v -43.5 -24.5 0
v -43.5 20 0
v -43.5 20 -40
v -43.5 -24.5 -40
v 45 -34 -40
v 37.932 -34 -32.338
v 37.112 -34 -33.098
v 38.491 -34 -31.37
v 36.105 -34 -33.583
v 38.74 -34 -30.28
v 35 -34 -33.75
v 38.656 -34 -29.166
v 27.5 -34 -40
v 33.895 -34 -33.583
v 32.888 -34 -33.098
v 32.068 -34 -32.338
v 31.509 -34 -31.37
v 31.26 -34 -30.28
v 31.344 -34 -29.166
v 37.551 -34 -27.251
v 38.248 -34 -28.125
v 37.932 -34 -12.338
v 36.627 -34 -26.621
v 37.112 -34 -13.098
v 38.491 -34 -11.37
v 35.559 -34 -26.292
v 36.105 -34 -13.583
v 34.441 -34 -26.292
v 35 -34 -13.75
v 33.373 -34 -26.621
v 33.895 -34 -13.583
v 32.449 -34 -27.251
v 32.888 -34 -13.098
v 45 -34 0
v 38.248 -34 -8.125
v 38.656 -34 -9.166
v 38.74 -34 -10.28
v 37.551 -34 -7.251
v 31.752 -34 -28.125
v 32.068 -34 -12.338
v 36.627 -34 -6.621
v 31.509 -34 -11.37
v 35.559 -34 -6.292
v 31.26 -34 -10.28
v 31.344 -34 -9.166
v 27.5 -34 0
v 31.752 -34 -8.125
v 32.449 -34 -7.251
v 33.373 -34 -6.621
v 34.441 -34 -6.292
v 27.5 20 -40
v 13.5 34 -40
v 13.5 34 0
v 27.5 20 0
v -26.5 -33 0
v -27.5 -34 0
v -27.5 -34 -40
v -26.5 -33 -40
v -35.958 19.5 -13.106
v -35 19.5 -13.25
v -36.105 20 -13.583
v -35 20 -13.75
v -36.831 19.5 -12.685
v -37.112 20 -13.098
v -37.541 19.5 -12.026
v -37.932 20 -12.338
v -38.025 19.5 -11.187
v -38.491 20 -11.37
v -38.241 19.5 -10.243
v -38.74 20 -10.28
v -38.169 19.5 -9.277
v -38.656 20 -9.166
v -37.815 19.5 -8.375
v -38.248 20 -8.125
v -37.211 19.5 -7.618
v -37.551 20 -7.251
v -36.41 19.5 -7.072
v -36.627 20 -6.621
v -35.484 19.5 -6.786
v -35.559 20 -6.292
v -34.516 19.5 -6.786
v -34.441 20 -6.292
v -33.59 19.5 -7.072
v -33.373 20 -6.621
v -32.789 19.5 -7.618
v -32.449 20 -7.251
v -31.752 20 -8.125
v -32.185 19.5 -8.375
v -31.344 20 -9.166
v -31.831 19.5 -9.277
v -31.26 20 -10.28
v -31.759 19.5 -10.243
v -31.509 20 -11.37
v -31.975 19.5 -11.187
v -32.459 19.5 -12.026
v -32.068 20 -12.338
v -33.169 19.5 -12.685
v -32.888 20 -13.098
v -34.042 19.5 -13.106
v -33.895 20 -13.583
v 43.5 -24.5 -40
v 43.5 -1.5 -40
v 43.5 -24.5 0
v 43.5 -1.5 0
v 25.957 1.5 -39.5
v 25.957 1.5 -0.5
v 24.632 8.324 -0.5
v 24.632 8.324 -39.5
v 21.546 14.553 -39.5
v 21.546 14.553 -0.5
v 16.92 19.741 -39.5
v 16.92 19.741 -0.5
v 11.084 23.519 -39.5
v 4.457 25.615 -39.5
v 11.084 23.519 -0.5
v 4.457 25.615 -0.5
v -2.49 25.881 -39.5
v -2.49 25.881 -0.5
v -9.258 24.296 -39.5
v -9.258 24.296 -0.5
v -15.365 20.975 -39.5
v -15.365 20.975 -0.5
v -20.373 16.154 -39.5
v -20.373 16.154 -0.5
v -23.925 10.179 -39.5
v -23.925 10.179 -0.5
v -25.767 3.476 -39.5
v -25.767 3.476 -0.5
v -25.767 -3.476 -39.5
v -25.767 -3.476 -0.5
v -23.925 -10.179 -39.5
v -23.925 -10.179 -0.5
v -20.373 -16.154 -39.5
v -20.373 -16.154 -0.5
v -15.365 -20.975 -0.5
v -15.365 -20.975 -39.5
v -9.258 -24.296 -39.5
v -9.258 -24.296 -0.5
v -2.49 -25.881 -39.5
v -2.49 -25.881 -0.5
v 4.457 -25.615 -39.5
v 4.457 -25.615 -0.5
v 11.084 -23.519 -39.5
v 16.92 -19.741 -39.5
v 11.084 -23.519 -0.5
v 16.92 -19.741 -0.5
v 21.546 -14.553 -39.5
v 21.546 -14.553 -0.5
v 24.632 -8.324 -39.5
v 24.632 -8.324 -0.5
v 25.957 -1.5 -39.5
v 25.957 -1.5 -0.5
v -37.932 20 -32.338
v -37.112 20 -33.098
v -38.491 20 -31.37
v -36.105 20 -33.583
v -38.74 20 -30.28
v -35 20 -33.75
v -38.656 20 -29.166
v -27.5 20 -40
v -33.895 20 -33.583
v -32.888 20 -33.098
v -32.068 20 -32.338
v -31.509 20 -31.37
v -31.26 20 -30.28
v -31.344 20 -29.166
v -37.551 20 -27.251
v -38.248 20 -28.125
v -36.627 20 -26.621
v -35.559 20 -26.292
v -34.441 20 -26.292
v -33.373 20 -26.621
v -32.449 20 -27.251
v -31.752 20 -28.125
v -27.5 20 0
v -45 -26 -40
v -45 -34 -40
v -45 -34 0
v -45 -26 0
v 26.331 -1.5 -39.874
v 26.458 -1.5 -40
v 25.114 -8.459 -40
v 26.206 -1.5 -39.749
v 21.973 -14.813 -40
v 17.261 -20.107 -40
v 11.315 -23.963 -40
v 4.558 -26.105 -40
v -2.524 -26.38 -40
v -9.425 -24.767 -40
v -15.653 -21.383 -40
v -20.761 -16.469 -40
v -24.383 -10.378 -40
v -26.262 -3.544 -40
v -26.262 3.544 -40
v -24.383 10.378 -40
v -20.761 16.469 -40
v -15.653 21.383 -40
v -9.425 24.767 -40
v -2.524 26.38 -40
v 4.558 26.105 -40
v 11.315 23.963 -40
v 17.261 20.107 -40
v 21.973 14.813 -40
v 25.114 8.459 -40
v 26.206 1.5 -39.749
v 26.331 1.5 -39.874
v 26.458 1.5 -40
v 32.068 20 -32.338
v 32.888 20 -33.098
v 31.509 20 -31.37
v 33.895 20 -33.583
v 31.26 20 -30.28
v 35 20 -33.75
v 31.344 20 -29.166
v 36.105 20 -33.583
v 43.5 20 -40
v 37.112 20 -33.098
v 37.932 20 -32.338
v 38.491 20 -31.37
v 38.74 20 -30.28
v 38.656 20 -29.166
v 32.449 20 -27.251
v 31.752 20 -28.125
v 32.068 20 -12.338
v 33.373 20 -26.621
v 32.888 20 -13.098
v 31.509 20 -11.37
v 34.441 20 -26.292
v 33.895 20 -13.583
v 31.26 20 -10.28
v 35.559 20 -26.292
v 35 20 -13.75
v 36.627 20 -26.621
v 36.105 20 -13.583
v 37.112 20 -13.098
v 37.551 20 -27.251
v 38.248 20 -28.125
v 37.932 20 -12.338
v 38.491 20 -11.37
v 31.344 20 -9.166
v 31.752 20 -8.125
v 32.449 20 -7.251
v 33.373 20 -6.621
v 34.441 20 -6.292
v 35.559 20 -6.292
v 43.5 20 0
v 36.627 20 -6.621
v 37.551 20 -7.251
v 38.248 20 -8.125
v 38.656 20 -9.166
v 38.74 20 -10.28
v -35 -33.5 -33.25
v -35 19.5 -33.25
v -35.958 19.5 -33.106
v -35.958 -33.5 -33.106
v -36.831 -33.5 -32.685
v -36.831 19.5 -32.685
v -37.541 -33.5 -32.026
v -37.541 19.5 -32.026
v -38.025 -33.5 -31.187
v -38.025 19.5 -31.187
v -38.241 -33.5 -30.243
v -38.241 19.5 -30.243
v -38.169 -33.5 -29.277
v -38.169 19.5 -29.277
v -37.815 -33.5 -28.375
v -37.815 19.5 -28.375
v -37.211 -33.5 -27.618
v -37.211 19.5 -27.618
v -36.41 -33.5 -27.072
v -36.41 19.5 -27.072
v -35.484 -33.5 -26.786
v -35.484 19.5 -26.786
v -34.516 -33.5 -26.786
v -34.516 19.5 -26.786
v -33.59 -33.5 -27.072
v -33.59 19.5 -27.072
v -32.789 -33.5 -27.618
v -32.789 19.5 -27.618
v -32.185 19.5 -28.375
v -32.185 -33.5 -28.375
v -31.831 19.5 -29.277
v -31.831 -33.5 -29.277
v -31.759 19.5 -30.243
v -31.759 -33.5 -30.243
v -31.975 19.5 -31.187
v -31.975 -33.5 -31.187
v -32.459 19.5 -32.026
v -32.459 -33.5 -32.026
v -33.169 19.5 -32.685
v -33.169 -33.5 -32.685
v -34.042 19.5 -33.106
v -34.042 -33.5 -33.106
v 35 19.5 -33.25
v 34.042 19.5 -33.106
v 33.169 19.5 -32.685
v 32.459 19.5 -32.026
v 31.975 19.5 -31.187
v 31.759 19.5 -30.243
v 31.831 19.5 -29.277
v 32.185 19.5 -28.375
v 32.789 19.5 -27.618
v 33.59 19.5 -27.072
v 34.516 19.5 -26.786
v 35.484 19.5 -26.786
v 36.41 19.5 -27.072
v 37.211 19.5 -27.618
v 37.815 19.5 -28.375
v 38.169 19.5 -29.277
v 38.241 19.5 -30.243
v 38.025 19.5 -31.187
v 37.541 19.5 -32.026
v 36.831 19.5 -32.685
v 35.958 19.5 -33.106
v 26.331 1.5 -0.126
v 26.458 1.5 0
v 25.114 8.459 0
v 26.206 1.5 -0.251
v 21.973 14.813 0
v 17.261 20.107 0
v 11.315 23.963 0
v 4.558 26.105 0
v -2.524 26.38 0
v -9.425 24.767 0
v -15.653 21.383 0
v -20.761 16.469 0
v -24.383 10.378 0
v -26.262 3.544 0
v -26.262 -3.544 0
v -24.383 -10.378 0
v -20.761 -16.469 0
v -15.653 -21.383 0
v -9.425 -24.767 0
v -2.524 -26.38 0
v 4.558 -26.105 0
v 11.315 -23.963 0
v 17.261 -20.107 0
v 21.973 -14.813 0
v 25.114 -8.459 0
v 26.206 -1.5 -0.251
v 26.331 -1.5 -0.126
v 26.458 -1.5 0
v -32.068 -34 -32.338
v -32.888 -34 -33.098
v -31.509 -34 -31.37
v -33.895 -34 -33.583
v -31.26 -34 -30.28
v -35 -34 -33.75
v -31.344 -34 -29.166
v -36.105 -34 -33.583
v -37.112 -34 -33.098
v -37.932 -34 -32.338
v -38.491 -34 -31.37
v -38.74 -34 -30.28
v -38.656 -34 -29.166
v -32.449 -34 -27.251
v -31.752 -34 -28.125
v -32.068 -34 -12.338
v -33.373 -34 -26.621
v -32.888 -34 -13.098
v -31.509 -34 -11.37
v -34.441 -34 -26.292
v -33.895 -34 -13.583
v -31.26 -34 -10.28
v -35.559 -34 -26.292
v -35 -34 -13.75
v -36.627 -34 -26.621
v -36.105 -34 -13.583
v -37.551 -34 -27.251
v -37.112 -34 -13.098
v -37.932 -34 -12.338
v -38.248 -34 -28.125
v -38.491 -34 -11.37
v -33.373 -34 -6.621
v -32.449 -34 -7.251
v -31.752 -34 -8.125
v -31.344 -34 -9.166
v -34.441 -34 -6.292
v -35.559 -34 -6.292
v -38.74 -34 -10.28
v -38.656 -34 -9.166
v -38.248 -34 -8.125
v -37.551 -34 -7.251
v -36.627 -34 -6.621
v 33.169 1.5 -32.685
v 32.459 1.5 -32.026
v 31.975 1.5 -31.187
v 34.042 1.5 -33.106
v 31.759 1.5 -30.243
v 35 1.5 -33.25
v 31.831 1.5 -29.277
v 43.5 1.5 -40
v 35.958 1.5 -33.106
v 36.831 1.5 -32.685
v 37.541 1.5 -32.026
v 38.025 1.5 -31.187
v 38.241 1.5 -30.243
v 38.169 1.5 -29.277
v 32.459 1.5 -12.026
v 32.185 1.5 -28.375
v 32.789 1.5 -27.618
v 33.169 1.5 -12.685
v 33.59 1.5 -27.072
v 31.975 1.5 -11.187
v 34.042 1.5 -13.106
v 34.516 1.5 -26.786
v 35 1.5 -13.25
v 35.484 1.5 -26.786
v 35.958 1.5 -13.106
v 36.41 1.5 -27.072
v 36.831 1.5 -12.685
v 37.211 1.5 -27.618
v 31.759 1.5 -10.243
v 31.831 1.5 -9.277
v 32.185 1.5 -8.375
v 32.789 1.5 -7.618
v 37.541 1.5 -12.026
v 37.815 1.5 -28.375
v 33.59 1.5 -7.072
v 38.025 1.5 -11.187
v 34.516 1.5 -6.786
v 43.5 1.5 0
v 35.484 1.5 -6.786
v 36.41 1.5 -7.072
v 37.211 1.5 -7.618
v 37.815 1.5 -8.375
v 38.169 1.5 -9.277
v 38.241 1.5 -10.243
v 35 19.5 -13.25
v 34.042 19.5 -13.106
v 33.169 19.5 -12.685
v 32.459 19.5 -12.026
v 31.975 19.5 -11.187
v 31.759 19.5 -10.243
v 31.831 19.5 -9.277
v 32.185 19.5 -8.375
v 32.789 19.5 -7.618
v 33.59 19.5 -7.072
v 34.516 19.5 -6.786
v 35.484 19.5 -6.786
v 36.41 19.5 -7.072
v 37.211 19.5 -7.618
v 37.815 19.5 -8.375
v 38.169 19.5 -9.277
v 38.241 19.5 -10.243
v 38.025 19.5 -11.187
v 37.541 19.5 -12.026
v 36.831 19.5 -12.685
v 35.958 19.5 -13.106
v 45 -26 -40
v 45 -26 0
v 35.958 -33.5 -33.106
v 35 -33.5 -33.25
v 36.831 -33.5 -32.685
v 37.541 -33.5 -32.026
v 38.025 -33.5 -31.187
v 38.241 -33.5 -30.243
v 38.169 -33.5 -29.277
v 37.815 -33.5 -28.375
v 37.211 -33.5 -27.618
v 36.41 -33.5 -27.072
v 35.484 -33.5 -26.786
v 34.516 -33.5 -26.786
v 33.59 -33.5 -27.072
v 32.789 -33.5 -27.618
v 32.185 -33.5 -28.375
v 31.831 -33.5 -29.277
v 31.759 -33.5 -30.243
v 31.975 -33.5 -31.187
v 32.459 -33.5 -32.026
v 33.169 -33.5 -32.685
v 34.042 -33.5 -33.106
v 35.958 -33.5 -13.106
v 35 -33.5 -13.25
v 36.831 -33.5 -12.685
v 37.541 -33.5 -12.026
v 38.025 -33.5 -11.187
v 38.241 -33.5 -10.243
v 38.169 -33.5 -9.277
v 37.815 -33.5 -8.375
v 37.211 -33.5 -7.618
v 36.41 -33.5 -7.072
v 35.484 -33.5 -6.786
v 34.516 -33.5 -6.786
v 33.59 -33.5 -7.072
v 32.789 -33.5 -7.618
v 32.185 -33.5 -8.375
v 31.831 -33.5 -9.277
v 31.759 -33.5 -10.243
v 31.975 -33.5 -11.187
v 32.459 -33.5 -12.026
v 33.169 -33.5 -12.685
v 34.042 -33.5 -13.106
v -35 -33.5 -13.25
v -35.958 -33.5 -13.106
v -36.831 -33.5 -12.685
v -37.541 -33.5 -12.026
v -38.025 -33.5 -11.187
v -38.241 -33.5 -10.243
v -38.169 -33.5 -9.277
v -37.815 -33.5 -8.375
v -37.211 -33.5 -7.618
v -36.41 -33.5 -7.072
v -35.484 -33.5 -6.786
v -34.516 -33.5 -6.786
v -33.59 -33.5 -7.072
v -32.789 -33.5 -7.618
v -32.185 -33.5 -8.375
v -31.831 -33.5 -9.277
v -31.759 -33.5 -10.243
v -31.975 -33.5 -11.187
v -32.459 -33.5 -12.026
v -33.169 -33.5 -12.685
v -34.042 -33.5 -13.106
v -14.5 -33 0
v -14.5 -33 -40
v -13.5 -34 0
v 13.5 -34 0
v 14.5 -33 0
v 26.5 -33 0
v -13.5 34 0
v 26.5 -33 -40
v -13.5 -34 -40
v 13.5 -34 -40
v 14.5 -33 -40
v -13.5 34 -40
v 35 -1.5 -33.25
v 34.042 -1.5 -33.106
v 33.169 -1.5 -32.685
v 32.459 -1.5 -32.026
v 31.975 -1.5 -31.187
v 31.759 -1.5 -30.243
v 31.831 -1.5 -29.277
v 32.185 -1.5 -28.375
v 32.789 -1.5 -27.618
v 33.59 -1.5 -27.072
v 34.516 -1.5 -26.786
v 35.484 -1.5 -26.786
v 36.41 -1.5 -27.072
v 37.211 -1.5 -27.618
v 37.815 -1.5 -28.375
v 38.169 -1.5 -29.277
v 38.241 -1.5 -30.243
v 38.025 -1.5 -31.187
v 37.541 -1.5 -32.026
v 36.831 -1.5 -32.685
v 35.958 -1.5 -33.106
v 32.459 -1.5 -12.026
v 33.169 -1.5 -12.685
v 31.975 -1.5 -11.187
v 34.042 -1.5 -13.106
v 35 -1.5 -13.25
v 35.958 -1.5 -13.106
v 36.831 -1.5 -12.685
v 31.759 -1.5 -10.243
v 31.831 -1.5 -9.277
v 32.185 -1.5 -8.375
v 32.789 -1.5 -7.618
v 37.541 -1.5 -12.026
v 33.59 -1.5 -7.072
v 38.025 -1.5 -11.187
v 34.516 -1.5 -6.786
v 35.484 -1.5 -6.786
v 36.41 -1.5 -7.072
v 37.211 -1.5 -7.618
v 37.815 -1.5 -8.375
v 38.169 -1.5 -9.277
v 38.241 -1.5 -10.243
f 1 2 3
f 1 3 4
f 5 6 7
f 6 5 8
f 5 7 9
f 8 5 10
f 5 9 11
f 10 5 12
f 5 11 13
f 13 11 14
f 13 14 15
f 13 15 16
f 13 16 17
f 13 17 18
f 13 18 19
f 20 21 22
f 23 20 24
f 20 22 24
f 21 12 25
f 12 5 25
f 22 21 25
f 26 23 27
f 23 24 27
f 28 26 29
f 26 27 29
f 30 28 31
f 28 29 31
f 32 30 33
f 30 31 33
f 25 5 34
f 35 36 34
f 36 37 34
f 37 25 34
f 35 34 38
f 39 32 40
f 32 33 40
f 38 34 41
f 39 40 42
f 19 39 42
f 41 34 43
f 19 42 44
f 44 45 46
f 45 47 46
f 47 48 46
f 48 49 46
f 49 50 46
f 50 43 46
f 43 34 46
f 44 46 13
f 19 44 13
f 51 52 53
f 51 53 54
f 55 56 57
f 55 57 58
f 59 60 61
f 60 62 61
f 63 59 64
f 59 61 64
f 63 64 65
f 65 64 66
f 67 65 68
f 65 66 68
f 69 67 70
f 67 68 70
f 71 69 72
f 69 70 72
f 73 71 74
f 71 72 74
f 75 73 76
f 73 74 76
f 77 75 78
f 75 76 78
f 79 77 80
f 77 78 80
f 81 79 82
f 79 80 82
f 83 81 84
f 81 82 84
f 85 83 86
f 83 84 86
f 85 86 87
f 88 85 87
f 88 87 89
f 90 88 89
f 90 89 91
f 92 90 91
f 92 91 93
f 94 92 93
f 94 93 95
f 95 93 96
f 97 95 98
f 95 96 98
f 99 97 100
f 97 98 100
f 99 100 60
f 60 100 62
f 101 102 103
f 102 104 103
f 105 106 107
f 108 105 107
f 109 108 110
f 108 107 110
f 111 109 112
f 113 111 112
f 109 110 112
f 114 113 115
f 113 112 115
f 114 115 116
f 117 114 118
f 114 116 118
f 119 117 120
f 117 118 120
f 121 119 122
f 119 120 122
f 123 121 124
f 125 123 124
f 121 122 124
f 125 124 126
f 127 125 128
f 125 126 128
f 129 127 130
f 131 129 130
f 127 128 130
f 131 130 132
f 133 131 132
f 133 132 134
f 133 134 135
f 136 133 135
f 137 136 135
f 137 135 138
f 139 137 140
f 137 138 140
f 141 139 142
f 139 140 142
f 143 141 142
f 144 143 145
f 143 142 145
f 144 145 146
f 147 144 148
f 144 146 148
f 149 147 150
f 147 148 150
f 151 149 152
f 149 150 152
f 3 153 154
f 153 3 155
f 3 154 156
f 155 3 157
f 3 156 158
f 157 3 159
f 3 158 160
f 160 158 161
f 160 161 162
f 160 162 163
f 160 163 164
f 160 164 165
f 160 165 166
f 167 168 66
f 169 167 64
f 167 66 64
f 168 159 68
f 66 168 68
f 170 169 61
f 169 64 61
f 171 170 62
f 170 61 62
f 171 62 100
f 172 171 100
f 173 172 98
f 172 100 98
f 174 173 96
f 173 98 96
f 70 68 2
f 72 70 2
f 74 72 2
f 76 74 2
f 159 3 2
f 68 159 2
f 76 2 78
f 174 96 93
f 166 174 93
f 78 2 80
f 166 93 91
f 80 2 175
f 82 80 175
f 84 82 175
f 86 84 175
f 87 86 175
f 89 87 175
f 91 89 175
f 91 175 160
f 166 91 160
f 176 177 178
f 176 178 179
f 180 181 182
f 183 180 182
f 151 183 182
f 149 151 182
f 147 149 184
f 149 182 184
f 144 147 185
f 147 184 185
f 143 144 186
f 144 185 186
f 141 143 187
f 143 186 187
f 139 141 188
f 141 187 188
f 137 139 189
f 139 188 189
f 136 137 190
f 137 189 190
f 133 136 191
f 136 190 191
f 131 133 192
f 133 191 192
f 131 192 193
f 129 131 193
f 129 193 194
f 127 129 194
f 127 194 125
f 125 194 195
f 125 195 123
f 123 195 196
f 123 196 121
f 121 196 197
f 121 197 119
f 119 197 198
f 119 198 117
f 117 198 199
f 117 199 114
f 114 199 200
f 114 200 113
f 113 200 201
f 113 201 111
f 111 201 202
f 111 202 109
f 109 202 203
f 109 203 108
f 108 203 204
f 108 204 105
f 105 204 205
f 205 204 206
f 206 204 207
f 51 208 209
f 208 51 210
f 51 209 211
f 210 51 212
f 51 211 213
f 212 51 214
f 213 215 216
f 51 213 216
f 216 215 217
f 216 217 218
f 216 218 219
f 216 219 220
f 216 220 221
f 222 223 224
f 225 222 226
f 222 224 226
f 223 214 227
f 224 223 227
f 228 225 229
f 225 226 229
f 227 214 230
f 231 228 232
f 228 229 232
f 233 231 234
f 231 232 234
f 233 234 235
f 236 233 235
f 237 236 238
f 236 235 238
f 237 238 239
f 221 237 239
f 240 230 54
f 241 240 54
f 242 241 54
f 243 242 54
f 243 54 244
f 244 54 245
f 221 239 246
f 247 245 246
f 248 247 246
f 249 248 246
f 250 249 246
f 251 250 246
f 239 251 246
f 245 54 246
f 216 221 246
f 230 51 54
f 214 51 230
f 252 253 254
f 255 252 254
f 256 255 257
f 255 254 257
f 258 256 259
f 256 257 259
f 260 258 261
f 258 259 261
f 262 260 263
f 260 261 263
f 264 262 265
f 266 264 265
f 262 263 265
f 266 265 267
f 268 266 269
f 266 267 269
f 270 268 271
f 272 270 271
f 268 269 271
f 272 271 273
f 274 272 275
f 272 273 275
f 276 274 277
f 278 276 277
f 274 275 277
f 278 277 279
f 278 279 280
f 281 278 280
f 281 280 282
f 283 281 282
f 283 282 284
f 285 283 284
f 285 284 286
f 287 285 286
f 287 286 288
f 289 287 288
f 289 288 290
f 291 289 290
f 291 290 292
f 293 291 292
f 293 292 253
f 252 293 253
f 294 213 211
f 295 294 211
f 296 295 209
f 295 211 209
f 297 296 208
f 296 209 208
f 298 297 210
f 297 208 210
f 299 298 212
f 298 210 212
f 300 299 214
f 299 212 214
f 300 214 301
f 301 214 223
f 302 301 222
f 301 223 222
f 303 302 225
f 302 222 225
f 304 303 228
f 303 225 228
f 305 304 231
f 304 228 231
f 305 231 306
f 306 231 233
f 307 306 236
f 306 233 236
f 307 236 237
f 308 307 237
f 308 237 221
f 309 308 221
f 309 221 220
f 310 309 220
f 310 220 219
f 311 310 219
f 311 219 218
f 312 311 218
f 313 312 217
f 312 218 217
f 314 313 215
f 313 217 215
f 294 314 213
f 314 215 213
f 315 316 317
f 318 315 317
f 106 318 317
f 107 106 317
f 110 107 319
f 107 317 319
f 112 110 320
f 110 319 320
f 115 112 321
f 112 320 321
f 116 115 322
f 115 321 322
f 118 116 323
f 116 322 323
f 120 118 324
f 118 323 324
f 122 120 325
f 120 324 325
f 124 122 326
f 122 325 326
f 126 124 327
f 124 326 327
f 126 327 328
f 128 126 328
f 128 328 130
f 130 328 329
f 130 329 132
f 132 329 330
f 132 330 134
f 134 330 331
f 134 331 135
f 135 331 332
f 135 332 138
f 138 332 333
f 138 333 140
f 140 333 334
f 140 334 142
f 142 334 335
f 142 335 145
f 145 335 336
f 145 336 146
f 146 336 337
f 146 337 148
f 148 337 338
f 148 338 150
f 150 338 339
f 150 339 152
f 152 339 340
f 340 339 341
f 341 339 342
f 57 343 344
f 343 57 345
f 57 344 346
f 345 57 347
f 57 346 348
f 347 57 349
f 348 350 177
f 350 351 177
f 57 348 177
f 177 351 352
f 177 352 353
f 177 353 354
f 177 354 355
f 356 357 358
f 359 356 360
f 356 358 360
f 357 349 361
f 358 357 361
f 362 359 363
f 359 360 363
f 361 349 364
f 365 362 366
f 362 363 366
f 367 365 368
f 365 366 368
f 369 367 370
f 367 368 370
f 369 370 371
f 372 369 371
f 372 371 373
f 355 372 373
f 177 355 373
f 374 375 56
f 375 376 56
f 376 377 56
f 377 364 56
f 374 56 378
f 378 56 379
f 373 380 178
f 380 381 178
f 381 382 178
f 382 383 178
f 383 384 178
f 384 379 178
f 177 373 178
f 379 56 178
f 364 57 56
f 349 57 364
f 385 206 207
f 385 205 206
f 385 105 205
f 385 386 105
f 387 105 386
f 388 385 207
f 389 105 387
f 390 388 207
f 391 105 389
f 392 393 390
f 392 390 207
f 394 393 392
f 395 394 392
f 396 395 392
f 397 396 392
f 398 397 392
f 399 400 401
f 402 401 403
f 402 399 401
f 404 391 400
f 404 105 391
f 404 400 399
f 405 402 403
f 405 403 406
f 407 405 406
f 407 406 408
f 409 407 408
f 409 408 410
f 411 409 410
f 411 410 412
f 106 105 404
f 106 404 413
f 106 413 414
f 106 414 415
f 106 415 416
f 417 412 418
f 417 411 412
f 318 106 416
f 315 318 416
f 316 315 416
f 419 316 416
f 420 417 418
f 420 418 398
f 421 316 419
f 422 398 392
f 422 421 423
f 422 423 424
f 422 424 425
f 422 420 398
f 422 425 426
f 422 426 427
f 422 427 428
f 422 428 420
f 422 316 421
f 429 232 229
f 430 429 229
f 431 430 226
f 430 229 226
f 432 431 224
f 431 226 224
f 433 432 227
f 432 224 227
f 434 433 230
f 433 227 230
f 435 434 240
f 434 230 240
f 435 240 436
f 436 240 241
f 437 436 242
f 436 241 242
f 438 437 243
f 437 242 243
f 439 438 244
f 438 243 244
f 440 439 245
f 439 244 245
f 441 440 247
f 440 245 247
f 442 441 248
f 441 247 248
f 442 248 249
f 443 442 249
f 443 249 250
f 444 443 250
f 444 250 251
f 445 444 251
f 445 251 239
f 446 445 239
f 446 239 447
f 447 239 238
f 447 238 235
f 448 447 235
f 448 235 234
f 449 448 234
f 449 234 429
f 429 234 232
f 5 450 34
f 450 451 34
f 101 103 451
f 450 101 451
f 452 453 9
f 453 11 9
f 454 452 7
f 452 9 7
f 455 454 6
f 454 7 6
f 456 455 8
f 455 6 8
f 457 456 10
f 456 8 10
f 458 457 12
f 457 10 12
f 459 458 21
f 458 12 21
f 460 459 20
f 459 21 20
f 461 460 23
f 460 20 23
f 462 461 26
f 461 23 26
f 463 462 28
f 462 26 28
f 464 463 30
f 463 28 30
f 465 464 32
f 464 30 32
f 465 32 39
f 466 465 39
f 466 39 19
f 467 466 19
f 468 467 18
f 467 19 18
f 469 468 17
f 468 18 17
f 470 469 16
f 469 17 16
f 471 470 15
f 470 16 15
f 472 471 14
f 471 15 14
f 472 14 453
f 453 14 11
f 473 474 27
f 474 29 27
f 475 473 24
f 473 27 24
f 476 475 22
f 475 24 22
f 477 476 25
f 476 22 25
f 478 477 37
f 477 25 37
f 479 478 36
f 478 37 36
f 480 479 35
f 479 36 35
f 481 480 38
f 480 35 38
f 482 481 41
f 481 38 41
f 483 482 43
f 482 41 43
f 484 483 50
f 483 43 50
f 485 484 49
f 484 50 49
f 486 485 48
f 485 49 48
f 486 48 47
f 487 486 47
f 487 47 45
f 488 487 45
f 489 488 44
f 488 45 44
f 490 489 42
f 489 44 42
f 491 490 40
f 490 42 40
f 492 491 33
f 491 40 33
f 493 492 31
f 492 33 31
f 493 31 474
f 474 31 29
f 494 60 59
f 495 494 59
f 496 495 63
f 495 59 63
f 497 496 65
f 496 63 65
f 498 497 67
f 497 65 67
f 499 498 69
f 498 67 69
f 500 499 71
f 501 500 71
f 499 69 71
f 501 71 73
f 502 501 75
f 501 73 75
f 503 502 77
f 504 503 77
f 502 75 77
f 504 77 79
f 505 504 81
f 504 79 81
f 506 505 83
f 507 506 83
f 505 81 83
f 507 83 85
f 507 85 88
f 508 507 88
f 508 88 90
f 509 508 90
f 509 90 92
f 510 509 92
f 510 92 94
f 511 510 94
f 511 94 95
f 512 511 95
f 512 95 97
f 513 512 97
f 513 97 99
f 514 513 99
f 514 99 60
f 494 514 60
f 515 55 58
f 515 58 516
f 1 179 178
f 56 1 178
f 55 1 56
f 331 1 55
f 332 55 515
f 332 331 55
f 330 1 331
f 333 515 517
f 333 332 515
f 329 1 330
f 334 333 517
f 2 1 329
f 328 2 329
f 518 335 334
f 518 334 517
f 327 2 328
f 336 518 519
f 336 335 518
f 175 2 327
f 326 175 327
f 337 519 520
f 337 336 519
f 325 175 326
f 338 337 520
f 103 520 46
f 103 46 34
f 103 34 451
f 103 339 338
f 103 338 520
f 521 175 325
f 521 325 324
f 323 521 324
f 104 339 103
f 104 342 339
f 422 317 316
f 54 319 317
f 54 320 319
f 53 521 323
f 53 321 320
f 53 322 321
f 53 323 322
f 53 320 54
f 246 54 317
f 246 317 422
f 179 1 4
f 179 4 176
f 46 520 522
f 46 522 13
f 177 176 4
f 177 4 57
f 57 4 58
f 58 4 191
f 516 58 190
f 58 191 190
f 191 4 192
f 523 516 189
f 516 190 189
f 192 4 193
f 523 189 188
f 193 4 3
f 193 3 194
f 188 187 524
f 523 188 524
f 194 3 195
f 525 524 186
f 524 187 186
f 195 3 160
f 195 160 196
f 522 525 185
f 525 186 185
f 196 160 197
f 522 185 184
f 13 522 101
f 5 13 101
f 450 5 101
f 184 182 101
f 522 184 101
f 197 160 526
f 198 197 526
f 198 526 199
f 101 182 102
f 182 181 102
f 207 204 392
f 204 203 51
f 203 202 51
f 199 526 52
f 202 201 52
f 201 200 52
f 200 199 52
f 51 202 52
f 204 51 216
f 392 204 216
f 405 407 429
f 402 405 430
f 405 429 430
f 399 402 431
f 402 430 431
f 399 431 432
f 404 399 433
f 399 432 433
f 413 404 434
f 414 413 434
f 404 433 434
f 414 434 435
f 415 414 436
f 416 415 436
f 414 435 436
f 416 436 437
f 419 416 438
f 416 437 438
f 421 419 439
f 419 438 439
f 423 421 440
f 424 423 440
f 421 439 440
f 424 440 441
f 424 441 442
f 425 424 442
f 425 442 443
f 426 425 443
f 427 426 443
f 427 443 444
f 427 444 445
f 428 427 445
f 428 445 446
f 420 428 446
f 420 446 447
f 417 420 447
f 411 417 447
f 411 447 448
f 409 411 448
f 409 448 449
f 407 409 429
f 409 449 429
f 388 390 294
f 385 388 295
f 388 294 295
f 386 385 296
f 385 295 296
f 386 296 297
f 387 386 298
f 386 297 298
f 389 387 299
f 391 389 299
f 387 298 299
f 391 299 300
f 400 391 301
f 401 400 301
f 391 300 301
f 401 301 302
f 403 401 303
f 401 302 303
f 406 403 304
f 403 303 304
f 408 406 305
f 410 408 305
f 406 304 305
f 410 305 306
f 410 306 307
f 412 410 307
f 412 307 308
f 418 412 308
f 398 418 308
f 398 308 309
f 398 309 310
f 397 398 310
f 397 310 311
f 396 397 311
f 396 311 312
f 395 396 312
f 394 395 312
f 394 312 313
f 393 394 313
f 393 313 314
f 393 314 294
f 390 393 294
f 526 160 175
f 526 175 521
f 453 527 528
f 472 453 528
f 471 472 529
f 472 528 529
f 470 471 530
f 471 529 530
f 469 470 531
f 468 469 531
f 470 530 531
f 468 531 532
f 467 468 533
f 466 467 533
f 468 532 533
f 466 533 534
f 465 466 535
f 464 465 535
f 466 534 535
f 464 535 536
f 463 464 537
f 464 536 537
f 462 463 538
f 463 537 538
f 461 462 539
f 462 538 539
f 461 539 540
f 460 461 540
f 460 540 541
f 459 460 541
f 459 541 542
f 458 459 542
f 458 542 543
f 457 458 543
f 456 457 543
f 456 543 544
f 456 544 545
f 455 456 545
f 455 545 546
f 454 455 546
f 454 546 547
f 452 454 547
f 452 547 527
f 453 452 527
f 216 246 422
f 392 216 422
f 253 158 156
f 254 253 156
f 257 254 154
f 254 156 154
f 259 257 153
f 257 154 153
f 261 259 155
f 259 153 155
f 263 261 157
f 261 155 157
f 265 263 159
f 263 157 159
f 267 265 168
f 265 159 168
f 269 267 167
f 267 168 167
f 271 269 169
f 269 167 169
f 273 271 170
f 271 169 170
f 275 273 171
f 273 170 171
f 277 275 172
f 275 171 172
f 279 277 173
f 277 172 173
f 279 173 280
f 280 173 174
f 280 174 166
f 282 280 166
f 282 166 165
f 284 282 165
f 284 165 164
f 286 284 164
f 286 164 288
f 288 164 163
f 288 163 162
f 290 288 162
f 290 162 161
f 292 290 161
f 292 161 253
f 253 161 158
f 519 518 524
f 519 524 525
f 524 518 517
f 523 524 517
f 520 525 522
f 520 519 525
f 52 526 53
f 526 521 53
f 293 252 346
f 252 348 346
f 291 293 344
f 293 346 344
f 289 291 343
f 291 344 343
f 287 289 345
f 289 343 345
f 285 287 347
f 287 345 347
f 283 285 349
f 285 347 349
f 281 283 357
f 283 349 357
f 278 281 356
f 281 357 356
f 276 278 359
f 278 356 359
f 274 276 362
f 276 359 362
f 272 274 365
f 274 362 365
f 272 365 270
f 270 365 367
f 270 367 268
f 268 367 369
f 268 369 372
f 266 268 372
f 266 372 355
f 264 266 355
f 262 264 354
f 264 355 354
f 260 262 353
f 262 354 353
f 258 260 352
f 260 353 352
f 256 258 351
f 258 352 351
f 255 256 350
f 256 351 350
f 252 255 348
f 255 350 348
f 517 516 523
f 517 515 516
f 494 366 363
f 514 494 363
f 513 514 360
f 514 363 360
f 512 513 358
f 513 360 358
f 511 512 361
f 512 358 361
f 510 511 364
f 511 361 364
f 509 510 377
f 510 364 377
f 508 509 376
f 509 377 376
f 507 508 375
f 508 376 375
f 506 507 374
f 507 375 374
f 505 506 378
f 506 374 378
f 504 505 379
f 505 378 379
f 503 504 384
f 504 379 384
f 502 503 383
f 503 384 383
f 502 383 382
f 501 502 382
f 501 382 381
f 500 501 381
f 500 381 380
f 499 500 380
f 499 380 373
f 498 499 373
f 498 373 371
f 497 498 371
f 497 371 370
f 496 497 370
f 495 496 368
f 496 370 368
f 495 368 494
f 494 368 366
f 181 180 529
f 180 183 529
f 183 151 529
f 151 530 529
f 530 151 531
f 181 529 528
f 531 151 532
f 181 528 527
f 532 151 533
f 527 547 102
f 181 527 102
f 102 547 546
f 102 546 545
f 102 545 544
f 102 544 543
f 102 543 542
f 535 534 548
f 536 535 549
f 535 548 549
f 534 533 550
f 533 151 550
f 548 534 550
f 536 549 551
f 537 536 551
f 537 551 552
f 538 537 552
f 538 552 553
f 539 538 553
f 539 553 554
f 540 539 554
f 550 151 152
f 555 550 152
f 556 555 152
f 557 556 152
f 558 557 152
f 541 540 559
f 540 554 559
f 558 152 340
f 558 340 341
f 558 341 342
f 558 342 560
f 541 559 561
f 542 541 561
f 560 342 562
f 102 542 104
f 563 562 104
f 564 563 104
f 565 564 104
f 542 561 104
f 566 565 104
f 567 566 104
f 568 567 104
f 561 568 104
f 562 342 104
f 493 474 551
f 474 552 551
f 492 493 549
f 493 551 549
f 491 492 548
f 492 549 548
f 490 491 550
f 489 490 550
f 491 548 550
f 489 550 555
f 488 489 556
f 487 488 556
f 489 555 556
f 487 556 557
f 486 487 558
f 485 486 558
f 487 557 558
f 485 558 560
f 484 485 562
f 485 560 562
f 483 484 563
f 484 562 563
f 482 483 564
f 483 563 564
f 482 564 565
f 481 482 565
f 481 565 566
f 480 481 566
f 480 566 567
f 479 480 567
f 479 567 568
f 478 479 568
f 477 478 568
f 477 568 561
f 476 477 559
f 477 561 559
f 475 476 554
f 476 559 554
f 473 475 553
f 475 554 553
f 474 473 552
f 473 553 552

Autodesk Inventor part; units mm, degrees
ref_plane "YZ Plane" through (0, 0, 0) normal (1, 0, 0) x (0, 1, 0)
ref_plane "XZ Plane" through (0, 0, 0) normal (0, 1, 0) x (-1, 0, 0)
ref_plane "XY Plane" through (0, 0, 0) normal (0, 0, 1) x (1, 0, 0)
sketch "Эскиз1" plane through (0, 0, 0) normal (0, 0, 1) x (1, 0, 0)
  line L0 (-45, 34) -> (45, 34)
  line L1 (45, 34) -> (45, -34)
  line L2 (45, -34) -> (-45, -34)
  line L3 (-45, -34) -> (-45, 34)
  point P0 (0, 0)
  point P1 (-45, 0)
  point P2 (0, 34)
  dimension "d0" = 90
  dimension "d1" = 68
extrude "Выдавливание1" add sketch "Эскиз1" against normal blind 40
sketch "Эскиз2" plane through (0, 0, 0) normal (0, 0, 1) x (1, 0, 0)
  line L0 (-45, -34) -> (-45, 34) projected
  line L1 (-45, 20) -> (-27.5, 20)
  line L2 (-27.5, 20) -> (-13.5, 34)
  line L3 (-13.5, 34) -> (13.5, 34)
  line L4 (-45, 34) -> (45, 34) projected
  line L5 (13.5, 34) -> (27.5, 20)
  line L6 (27.5, 20) -> (45, 20)
  line L7 (45, 34) -> (45, -34) projected
  line L8 (45, -34) -> (-45, -34) projected
  point P0 (0, 0)
  dimension "d4" = 27
  dimension "d5" = 55
  dimension "d6" = 17.5
  dimension "d7" = 14
  dimension "d8" = 54
  dimension "d9" = 135
extrude "Выдавливание2" cut sketch "Эскиз2" against normal blind 40 contours L0 L4 L2 L1 | L6 L5 L4 L7
sketch "Эскиз3" plane through (0, 0, 0) normal (0, 0, 1) x (1, 0, 0)
  line L0 (-45, 20) -> (-27.5, 20) projected
  line L1 (-43.5, 20) -> (-43.5, -24.5)
  line L2 (-43.5, -24.5) -> (-45, -26)
  line L3 (-45, -34) -> (-45, 20) projected
  line L4 (45, -34) -> (-45, -34) projected
  point P0 (0, 0)
  dimension "d12" = 1.5
  dimension "d13" = 1.5
  dimension "d14" = 8
extrude "Выдавливание3" cut sketch "Эскиз3" against normal blind 40
sketch "Эскиз5" plane through (0, 0, 0) normal (0, 0, 1) x (1, 0, 0)
  line L0 (27.5, 20) -> (45, 20) projected
  line L1 (43.5, 20) -> (43.5, -24.5)
  line L2 (43.5, -24.5) -> (45, -26)
  line L3 (45, 20) -> (45, -34) projected
  point P0 (0, 0)
  point P1 (-43.5, -24.5)
  point P2 (-45, -26)
  dimension "d21" = 1.5
extrude "Выдавливание4" cut sketch "Эскиз5" against normal blind 40
sketch "Эскиз6" plane through (0, 0, 0) normal (0, 0, 1) x (1, 0, 0)
  circle A0 centre (0, 0) radius 26
  line L0 (25.9567, 1.5) -> (43.5, 1.5)
  line L1 (43.5, 20) -> (43.5, -24.5) projected
  line L2 (25.9567, -1.5) -> (43.5, -1.5)
  line L3 (45, -34) -> (-45, -34) projected
  point P0 (0, -26)
  dimension "d24" = 52
  dimension "d25" = 8
  dimension "d26" = 3
  dimension "d27" = 1.5
extrude "Выдавливание5" cut sketch "Эскиз6" against normal blind 40
sketch "Эскиз7" plane through (-45, -34, 0) normal (0, -1, 0) x (1, 0, 0)
  line L0 (90, 0) -> (0, 0) projected
  line L1 (0, 0) -> (0, -40) projected
  point P0 (45, 0)
  point P1 (80, -30)
  point P2 (80, -10)
  point P3 (10, -10)
  point P4 (10, -30)
  dimension "d30" = 20
  dimension "d31" = 70
  dimension "d32" = 10
  dimension "d33" = 10
hole "Отверстие1" at (35, -34, -30) at (35, -34, -10) at (-35, -34, -10) at (-35, -34, -30) direction (0, 1, 0) diameter 6.5 end through all
chamfer "Фаска1" distance 0.5 angle 45 10 edges at (35, 20, -26.75) (35, 20, -6.75) (-35, 20, -26.75) (-35, 20, -6.75) (-26, 0, -40) (-26, 0, 0) (35, -34, -26.75) (-35, -34, -26.75) (35, -34, -6.75) (-35, -34, -6.75)
sketch "Эскиз8" plane through (0, 0, 0) normal (0, 0, 1) x (1, 0, 0)
  line L0 (45, -34) -> (-45, -34) projected
  line L1 (-27.5, -34) -> (-26.5, -33)
  line L2 (-26.5, -33) -> (-14.5, -33)
  line L3 (-14.5, -33) -> (-13.5, -34)
  line L4 (13.5, -34) -> (14.5, -33)
  line L5 (14.5, -33) -> (26.5, -33)
  line L6 (26.5, -33) -> (27.5, -34)
  point P0 (0, 0)
  point P1 (-27.5, 20)
  point P2 (-13.5, 34)
  point P3 (13.5, 34)
  point P4 (27.5, 20)
  dimension "d44" = 1
  dimension "d45" = 45
  dimension "d46" = 45
  dimension "d47" = 45
extrude "Выдавливание6" cut sketch "Эскиз8" against normal blind 40
properties part number "SMK52"
